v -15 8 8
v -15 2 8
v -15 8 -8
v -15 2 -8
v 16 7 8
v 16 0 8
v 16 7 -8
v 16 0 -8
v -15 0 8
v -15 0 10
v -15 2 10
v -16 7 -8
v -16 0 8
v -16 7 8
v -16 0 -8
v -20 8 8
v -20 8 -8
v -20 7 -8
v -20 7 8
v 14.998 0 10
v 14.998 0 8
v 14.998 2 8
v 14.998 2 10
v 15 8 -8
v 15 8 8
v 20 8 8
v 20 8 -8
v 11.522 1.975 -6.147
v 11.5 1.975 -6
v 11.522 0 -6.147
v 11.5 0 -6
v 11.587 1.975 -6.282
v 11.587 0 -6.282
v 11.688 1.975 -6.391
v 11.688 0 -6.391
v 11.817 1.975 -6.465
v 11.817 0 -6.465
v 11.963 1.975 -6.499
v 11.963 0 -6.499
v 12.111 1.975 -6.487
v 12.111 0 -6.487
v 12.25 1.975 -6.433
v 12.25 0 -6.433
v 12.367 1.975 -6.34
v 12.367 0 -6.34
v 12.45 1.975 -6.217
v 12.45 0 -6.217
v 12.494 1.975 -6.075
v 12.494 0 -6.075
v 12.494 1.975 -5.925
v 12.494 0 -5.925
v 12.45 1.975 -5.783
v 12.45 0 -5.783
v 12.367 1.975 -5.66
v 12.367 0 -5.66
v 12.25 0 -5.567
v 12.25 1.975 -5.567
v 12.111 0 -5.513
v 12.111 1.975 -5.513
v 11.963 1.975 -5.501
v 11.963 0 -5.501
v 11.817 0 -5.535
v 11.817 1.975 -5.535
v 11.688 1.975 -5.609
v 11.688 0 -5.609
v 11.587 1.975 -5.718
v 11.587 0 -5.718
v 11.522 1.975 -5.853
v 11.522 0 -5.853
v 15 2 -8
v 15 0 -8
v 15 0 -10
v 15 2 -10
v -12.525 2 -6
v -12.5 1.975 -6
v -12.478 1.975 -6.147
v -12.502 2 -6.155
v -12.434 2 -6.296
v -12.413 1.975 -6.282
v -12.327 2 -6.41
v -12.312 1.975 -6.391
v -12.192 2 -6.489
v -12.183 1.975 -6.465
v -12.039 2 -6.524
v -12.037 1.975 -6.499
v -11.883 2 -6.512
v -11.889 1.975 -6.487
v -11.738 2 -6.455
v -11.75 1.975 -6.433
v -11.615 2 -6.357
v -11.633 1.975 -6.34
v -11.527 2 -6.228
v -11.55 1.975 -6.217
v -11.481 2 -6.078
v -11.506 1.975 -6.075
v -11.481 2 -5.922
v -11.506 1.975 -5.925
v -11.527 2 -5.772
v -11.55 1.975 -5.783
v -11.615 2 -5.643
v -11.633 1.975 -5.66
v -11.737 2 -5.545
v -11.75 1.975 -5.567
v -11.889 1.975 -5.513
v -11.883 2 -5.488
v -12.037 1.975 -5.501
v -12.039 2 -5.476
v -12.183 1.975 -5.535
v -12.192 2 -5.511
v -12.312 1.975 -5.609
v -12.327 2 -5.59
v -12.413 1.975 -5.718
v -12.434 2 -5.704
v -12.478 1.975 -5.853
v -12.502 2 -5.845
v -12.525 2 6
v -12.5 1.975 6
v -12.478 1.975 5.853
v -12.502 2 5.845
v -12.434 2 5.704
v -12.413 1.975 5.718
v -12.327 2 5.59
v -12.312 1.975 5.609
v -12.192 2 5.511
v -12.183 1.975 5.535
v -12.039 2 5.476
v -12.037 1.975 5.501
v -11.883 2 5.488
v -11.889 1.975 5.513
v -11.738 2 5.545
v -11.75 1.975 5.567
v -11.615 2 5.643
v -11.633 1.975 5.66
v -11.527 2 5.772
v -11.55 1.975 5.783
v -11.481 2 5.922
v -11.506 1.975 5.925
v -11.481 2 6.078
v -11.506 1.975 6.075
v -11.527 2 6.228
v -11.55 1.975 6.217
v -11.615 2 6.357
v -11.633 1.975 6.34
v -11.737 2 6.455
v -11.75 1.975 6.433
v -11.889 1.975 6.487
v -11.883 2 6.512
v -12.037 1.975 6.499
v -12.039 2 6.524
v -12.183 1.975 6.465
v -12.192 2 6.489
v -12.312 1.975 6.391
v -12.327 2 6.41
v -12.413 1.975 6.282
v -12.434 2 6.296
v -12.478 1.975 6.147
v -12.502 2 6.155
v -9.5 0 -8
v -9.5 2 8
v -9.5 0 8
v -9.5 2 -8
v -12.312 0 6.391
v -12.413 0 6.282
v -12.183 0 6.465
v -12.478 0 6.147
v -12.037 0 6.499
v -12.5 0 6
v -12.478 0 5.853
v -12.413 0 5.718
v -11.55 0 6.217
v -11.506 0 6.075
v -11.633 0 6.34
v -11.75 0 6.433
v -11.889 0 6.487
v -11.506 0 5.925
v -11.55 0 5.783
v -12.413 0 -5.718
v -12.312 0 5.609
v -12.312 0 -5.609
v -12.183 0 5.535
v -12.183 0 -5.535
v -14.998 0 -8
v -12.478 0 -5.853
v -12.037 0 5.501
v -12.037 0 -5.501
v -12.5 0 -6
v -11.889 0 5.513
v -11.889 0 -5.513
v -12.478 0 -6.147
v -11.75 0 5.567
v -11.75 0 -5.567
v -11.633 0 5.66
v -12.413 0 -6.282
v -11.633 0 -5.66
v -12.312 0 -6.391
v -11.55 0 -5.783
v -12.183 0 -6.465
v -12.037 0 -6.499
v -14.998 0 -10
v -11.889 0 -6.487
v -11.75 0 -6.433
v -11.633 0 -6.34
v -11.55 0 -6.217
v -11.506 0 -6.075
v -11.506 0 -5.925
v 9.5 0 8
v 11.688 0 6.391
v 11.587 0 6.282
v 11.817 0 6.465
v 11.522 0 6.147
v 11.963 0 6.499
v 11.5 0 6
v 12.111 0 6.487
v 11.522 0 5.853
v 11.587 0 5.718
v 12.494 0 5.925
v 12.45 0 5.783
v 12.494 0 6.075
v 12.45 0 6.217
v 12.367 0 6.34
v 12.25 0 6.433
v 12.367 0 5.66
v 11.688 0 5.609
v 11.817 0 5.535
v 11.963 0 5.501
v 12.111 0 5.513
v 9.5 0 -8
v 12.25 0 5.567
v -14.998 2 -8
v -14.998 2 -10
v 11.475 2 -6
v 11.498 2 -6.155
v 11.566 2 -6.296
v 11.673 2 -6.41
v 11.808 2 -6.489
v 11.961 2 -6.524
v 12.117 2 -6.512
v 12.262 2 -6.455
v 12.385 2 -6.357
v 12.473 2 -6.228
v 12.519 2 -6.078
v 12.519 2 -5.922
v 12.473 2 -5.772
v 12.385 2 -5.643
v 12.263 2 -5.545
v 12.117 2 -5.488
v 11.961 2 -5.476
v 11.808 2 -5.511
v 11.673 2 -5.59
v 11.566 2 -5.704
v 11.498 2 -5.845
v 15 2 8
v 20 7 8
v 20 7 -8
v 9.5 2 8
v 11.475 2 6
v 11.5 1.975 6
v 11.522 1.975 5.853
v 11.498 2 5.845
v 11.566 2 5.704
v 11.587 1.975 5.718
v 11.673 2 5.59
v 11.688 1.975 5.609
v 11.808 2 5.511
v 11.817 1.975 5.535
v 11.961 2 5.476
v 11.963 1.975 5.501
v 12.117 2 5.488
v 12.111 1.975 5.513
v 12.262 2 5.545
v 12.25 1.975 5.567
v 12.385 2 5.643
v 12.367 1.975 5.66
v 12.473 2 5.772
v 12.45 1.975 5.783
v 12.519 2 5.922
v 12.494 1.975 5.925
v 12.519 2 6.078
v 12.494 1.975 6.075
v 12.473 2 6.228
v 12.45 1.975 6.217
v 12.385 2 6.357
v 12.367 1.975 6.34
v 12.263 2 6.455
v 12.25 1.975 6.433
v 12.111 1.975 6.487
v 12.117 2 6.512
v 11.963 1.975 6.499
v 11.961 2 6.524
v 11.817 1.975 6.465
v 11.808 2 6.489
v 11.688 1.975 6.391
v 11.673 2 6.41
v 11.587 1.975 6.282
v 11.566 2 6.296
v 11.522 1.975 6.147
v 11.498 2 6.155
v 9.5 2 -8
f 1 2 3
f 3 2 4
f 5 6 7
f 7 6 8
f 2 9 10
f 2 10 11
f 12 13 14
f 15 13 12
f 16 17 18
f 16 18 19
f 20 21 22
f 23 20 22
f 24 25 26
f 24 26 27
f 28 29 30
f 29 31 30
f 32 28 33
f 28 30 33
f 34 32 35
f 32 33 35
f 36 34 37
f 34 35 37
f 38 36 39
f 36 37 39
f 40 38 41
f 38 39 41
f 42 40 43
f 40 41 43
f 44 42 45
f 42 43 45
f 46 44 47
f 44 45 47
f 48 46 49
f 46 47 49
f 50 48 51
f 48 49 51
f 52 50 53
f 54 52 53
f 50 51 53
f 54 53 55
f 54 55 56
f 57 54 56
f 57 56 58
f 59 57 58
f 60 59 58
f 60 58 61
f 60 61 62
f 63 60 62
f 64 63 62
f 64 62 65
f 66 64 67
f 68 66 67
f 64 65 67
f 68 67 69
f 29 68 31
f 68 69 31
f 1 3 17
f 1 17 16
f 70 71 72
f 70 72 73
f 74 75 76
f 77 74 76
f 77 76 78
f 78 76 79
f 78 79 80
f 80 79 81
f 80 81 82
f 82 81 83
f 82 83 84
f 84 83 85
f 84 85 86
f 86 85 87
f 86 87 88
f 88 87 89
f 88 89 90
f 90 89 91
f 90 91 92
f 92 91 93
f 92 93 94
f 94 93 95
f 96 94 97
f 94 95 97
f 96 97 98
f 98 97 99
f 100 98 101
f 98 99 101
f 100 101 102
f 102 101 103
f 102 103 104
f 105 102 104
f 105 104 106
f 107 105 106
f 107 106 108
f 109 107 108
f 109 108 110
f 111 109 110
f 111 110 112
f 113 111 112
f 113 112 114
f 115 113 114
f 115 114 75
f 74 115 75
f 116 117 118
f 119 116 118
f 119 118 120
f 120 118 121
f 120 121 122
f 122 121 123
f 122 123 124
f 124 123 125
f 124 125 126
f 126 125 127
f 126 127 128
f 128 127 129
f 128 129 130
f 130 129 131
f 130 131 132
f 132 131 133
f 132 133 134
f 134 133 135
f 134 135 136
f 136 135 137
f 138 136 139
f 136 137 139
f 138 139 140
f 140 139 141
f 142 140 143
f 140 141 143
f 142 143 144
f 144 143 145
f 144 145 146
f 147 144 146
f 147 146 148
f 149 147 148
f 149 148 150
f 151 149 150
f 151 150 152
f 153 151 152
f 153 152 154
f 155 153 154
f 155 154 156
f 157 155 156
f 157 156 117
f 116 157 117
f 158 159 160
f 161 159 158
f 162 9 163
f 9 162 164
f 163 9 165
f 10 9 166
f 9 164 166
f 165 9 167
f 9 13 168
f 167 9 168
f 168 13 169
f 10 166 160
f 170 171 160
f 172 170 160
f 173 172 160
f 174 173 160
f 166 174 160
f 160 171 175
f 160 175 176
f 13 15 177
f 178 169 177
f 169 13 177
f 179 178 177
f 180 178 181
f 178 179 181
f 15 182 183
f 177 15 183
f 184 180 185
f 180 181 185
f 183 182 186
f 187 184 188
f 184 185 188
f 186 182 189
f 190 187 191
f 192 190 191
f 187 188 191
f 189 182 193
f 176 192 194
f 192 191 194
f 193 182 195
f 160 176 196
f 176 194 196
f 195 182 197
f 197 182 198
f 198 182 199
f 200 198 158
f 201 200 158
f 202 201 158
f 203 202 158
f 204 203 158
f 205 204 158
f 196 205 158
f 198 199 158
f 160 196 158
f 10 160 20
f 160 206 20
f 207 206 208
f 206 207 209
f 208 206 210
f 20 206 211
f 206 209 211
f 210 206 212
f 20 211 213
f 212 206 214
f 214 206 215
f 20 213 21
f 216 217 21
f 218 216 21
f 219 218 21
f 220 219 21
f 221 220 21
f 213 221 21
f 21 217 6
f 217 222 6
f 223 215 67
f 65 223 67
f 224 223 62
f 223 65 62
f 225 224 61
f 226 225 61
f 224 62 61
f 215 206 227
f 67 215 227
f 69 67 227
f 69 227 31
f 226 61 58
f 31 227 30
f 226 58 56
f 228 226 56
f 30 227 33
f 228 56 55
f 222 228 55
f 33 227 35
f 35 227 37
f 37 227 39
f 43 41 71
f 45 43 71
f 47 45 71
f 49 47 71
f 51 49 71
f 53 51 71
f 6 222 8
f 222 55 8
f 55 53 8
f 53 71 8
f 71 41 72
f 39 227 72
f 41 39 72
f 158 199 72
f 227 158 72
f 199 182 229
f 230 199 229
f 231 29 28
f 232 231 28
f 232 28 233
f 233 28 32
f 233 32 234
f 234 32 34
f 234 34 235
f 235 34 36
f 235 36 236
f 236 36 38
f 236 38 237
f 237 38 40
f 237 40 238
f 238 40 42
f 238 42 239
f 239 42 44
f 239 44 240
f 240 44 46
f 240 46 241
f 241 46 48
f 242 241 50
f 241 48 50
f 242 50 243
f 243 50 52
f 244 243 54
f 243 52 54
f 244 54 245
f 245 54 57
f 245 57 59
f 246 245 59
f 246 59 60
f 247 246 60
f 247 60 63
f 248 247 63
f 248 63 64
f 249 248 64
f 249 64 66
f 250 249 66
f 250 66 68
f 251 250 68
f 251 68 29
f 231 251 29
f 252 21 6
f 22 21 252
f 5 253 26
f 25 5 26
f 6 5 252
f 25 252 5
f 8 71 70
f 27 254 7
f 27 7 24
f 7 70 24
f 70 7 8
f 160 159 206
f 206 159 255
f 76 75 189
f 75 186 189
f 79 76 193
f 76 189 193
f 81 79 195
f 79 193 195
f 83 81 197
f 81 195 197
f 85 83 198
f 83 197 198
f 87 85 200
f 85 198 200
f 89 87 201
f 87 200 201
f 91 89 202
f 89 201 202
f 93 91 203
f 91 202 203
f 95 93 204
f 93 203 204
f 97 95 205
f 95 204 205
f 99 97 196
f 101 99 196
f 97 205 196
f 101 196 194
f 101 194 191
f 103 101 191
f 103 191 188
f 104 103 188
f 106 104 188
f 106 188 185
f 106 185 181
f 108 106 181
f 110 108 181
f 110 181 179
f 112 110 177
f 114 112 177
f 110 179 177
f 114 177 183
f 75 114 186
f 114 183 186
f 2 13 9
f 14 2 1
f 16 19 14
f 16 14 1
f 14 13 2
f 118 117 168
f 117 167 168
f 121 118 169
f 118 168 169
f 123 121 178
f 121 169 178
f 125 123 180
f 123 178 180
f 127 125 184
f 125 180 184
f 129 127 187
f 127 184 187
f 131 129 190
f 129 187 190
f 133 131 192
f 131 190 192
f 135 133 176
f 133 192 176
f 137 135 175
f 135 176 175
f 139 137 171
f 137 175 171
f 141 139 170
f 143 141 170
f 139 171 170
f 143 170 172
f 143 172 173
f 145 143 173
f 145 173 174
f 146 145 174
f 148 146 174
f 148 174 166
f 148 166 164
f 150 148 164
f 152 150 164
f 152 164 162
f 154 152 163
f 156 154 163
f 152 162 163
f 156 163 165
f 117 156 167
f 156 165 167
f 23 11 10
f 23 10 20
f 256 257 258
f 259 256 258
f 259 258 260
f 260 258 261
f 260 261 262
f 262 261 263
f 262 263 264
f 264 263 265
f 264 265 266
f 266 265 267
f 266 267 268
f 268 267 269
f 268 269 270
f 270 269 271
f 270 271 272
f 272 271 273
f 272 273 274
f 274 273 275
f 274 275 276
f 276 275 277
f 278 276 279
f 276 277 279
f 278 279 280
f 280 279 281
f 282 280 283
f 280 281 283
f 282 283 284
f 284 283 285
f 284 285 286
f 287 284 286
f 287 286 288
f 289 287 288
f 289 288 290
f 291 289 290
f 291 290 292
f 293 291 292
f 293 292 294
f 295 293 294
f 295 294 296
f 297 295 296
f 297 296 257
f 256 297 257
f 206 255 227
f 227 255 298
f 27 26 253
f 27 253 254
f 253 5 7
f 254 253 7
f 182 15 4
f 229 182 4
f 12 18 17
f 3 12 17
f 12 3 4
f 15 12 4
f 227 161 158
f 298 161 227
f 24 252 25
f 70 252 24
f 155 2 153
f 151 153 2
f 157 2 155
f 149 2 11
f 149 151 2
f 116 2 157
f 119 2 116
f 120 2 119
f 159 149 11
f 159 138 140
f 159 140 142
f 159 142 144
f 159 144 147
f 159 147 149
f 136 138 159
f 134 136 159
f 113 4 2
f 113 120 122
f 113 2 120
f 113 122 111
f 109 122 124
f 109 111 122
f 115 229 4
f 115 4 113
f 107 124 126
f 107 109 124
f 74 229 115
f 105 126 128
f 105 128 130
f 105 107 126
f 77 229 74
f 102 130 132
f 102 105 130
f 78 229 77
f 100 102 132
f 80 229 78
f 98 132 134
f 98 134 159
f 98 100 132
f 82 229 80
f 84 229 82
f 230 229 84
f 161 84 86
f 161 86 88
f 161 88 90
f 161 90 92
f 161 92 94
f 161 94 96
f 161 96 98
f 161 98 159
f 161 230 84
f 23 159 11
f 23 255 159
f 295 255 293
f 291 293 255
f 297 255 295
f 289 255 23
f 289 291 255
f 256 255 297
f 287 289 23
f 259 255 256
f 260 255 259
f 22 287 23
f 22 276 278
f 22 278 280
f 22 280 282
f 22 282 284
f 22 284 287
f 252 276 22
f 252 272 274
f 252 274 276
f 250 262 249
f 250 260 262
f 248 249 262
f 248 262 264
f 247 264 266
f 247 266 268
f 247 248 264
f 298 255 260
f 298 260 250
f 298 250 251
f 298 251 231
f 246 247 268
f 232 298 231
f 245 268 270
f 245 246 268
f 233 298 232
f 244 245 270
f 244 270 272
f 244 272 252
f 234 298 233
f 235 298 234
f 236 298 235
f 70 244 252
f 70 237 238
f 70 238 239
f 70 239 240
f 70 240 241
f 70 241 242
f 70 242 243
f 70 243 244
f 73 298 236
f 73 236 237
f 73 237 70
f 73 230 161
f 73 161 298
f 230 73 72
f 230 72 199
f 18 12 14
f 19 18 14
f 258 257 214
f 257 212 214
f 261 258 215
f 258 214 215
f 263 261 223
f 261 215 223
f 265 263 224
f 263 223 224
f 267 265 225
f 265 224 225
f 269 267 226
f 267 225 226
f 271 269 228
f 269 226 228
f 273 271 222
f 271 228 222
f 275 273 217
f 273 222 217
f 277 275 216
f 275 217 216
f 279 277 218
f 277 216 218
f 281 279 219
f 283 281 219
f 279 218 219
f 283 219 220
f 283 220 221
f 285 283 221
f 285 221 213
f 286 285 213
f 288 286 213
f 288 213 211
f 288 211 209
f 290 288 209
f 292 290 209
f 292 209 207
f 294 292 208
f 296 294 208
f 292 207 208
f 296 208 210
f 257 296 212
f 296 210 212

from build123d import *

# Parameters (mm, degrees)
SKETCH_1_W                      = 32
SKETCH_1_H                      = 16
EXTRUDE_1_DEPTH                 = 2
SKETCH_2_W                      = 1
SKETCH_2_H                      = 16
EXTRUDE_2_DEPTH                 = 6
SKETCH_3_W                      = 1
SKETCH_3_H                      = 16
EXTRUDE_3_DEPTH                 = 6
SKETCH_4_W                      = 16
SKETCH_4_H                      = 1
EXTRUDE_4_DEPTH                 = 4
SKETCH_5_W                      = 16
SKETCH_5_H                      = 1
EXTRUDE_5_DEPTH                 = 4
HOLE_WIZARD_1_0_1_1_D           = 1
HOLE_WIZARD_1_0_1_1_CSINK_D     = 1.05
HOLE_WIZARD_1_0_1_1_CSINK_ANGLE = 90
SKETCH_14_W                     = 29.99841147
SKETCH_14_H                     = 2
EXTRUDE_6_DEPTH                 = 2
SKETCH_15_W                     = 29.99841147
SKETCH_15_H                     = 2
EXTRUDE_7_DEPTH                 = 2
SKETCH_16_W                     = 19
SKETCH_16_H                     = 16
CUT_EXTRUDE_1_DEPTH             = 2


with BuildPart() as part:
    # 草图1 → 凸台-拉伸1 (new body)
    with BuildSketch(Plane(origin=(0, 0, 0), x_dir=(1, 0, 0), z_dir=(0, 1, 0))):
        Rectangle(SKETCH_1_W, SKETCH_1_H)
    extrude(amount=EXTRUDE_1_DEPTH)

    # 草图2 → 凸台-拉伸2 (add)
    with BuildSketch(Plane(origin=(0, 2, 0), x_dir=(1, 0, 0), z_dir=(0, 1, 0))):
        with Locations((-15.5, 0)):
            Rectangle(SKETCH_2_W, SKETCH_2_H)
    extrude(amount=EXTRUDE_2_DEPTH)

    # 草图3 → 凸台-拉伸3 (add)
    with BuildSketch(Plane(origin=(0, 2, 0), x_dir=(1, 0, 0), z_dir=(0, 1, 0))):
        with Locations((15.5, 0)):
            Rectangle(SKETCH_3_W, SKETCH_3_H)
    extrude(amount=EXTRUDE_3_DEPTH)

    # 草图4 → 凸台-拉伸4 (add)
    with BuildSketch(Plane.ZY.offset(16)):
        with Locations((0, 7.5)):
            Rectangle(SKETCH_4_W, SKETCH_4_H)
    extrude(amount=EXTRUDE_4_DEPTH)

    # 草图5 → 凸台-拉伸5 (add)
    with BuildSketch(Plane(origin=(16, 0, 0), x_dir=(0, 0, -1), z_dir=(1, 0, 0))):
        with Locations((0, 7.5)):
            Rectangle(SKETCH_5_W, SKETCH_5_H)
    extrude(amount=EXTRUDE_5_DEPTH)

    # Ø1.0 (1) 直径孔1 (through all)
    with Locations(Plane(origin=(0, 2, 0), x_dir=(1, 0, 0), z_dir=(0, 1, 0))):
        with Locations((-12, 6), (-12, -6), (12, -6), (12, 6)):
            CounterSinkHole(HOLE_WIZARD_1_0_1_1_D / 2, HOLE_WIZARD_1_0_1_1_CSINK_D / 2, counter_sink_angle=HOLE_WIZARD_1_0_1_1_CSINK_ANGLE)

    # 草图14 → 凸台-拉伸6 (add)
    with BuildSketch(Plane(origin=(0, 0, -8), x_dir=(-1, 0, 0), z_dir=(0, 0, -1))):
        with Locations((-0.000794265, 1)):
            Rectangle(SKETCH_14_W, SKETCH_14_H)
    extrude(amount=EXTRUDE_6_DEPTH)

    # 草图15 → 凸台-拉伸7 (add)
    with BuildSketch(Plane.XY.offset(8)):
        with Locations((-0.000794265, 1)):
            Rectangle(SKETCH_15_W, SKETCH_15_H)
    extrude(amount=EXTRUDE_7_DEPTH)

    # 草图16 → 切除-拉伸1 (cut)
    with BuildSketch(Plane(origin=(0, 2, 0), x_dir=(1, 0, 0), z_dir=(0, 1, 0))):
        Rectangle(SKETCH_16_W, SKETCH_16_H)
    extrude(amount=-CUT_EXTRUDE_1_DEPTH, mode=Mode.SUBTRACT)


solid = part.part
